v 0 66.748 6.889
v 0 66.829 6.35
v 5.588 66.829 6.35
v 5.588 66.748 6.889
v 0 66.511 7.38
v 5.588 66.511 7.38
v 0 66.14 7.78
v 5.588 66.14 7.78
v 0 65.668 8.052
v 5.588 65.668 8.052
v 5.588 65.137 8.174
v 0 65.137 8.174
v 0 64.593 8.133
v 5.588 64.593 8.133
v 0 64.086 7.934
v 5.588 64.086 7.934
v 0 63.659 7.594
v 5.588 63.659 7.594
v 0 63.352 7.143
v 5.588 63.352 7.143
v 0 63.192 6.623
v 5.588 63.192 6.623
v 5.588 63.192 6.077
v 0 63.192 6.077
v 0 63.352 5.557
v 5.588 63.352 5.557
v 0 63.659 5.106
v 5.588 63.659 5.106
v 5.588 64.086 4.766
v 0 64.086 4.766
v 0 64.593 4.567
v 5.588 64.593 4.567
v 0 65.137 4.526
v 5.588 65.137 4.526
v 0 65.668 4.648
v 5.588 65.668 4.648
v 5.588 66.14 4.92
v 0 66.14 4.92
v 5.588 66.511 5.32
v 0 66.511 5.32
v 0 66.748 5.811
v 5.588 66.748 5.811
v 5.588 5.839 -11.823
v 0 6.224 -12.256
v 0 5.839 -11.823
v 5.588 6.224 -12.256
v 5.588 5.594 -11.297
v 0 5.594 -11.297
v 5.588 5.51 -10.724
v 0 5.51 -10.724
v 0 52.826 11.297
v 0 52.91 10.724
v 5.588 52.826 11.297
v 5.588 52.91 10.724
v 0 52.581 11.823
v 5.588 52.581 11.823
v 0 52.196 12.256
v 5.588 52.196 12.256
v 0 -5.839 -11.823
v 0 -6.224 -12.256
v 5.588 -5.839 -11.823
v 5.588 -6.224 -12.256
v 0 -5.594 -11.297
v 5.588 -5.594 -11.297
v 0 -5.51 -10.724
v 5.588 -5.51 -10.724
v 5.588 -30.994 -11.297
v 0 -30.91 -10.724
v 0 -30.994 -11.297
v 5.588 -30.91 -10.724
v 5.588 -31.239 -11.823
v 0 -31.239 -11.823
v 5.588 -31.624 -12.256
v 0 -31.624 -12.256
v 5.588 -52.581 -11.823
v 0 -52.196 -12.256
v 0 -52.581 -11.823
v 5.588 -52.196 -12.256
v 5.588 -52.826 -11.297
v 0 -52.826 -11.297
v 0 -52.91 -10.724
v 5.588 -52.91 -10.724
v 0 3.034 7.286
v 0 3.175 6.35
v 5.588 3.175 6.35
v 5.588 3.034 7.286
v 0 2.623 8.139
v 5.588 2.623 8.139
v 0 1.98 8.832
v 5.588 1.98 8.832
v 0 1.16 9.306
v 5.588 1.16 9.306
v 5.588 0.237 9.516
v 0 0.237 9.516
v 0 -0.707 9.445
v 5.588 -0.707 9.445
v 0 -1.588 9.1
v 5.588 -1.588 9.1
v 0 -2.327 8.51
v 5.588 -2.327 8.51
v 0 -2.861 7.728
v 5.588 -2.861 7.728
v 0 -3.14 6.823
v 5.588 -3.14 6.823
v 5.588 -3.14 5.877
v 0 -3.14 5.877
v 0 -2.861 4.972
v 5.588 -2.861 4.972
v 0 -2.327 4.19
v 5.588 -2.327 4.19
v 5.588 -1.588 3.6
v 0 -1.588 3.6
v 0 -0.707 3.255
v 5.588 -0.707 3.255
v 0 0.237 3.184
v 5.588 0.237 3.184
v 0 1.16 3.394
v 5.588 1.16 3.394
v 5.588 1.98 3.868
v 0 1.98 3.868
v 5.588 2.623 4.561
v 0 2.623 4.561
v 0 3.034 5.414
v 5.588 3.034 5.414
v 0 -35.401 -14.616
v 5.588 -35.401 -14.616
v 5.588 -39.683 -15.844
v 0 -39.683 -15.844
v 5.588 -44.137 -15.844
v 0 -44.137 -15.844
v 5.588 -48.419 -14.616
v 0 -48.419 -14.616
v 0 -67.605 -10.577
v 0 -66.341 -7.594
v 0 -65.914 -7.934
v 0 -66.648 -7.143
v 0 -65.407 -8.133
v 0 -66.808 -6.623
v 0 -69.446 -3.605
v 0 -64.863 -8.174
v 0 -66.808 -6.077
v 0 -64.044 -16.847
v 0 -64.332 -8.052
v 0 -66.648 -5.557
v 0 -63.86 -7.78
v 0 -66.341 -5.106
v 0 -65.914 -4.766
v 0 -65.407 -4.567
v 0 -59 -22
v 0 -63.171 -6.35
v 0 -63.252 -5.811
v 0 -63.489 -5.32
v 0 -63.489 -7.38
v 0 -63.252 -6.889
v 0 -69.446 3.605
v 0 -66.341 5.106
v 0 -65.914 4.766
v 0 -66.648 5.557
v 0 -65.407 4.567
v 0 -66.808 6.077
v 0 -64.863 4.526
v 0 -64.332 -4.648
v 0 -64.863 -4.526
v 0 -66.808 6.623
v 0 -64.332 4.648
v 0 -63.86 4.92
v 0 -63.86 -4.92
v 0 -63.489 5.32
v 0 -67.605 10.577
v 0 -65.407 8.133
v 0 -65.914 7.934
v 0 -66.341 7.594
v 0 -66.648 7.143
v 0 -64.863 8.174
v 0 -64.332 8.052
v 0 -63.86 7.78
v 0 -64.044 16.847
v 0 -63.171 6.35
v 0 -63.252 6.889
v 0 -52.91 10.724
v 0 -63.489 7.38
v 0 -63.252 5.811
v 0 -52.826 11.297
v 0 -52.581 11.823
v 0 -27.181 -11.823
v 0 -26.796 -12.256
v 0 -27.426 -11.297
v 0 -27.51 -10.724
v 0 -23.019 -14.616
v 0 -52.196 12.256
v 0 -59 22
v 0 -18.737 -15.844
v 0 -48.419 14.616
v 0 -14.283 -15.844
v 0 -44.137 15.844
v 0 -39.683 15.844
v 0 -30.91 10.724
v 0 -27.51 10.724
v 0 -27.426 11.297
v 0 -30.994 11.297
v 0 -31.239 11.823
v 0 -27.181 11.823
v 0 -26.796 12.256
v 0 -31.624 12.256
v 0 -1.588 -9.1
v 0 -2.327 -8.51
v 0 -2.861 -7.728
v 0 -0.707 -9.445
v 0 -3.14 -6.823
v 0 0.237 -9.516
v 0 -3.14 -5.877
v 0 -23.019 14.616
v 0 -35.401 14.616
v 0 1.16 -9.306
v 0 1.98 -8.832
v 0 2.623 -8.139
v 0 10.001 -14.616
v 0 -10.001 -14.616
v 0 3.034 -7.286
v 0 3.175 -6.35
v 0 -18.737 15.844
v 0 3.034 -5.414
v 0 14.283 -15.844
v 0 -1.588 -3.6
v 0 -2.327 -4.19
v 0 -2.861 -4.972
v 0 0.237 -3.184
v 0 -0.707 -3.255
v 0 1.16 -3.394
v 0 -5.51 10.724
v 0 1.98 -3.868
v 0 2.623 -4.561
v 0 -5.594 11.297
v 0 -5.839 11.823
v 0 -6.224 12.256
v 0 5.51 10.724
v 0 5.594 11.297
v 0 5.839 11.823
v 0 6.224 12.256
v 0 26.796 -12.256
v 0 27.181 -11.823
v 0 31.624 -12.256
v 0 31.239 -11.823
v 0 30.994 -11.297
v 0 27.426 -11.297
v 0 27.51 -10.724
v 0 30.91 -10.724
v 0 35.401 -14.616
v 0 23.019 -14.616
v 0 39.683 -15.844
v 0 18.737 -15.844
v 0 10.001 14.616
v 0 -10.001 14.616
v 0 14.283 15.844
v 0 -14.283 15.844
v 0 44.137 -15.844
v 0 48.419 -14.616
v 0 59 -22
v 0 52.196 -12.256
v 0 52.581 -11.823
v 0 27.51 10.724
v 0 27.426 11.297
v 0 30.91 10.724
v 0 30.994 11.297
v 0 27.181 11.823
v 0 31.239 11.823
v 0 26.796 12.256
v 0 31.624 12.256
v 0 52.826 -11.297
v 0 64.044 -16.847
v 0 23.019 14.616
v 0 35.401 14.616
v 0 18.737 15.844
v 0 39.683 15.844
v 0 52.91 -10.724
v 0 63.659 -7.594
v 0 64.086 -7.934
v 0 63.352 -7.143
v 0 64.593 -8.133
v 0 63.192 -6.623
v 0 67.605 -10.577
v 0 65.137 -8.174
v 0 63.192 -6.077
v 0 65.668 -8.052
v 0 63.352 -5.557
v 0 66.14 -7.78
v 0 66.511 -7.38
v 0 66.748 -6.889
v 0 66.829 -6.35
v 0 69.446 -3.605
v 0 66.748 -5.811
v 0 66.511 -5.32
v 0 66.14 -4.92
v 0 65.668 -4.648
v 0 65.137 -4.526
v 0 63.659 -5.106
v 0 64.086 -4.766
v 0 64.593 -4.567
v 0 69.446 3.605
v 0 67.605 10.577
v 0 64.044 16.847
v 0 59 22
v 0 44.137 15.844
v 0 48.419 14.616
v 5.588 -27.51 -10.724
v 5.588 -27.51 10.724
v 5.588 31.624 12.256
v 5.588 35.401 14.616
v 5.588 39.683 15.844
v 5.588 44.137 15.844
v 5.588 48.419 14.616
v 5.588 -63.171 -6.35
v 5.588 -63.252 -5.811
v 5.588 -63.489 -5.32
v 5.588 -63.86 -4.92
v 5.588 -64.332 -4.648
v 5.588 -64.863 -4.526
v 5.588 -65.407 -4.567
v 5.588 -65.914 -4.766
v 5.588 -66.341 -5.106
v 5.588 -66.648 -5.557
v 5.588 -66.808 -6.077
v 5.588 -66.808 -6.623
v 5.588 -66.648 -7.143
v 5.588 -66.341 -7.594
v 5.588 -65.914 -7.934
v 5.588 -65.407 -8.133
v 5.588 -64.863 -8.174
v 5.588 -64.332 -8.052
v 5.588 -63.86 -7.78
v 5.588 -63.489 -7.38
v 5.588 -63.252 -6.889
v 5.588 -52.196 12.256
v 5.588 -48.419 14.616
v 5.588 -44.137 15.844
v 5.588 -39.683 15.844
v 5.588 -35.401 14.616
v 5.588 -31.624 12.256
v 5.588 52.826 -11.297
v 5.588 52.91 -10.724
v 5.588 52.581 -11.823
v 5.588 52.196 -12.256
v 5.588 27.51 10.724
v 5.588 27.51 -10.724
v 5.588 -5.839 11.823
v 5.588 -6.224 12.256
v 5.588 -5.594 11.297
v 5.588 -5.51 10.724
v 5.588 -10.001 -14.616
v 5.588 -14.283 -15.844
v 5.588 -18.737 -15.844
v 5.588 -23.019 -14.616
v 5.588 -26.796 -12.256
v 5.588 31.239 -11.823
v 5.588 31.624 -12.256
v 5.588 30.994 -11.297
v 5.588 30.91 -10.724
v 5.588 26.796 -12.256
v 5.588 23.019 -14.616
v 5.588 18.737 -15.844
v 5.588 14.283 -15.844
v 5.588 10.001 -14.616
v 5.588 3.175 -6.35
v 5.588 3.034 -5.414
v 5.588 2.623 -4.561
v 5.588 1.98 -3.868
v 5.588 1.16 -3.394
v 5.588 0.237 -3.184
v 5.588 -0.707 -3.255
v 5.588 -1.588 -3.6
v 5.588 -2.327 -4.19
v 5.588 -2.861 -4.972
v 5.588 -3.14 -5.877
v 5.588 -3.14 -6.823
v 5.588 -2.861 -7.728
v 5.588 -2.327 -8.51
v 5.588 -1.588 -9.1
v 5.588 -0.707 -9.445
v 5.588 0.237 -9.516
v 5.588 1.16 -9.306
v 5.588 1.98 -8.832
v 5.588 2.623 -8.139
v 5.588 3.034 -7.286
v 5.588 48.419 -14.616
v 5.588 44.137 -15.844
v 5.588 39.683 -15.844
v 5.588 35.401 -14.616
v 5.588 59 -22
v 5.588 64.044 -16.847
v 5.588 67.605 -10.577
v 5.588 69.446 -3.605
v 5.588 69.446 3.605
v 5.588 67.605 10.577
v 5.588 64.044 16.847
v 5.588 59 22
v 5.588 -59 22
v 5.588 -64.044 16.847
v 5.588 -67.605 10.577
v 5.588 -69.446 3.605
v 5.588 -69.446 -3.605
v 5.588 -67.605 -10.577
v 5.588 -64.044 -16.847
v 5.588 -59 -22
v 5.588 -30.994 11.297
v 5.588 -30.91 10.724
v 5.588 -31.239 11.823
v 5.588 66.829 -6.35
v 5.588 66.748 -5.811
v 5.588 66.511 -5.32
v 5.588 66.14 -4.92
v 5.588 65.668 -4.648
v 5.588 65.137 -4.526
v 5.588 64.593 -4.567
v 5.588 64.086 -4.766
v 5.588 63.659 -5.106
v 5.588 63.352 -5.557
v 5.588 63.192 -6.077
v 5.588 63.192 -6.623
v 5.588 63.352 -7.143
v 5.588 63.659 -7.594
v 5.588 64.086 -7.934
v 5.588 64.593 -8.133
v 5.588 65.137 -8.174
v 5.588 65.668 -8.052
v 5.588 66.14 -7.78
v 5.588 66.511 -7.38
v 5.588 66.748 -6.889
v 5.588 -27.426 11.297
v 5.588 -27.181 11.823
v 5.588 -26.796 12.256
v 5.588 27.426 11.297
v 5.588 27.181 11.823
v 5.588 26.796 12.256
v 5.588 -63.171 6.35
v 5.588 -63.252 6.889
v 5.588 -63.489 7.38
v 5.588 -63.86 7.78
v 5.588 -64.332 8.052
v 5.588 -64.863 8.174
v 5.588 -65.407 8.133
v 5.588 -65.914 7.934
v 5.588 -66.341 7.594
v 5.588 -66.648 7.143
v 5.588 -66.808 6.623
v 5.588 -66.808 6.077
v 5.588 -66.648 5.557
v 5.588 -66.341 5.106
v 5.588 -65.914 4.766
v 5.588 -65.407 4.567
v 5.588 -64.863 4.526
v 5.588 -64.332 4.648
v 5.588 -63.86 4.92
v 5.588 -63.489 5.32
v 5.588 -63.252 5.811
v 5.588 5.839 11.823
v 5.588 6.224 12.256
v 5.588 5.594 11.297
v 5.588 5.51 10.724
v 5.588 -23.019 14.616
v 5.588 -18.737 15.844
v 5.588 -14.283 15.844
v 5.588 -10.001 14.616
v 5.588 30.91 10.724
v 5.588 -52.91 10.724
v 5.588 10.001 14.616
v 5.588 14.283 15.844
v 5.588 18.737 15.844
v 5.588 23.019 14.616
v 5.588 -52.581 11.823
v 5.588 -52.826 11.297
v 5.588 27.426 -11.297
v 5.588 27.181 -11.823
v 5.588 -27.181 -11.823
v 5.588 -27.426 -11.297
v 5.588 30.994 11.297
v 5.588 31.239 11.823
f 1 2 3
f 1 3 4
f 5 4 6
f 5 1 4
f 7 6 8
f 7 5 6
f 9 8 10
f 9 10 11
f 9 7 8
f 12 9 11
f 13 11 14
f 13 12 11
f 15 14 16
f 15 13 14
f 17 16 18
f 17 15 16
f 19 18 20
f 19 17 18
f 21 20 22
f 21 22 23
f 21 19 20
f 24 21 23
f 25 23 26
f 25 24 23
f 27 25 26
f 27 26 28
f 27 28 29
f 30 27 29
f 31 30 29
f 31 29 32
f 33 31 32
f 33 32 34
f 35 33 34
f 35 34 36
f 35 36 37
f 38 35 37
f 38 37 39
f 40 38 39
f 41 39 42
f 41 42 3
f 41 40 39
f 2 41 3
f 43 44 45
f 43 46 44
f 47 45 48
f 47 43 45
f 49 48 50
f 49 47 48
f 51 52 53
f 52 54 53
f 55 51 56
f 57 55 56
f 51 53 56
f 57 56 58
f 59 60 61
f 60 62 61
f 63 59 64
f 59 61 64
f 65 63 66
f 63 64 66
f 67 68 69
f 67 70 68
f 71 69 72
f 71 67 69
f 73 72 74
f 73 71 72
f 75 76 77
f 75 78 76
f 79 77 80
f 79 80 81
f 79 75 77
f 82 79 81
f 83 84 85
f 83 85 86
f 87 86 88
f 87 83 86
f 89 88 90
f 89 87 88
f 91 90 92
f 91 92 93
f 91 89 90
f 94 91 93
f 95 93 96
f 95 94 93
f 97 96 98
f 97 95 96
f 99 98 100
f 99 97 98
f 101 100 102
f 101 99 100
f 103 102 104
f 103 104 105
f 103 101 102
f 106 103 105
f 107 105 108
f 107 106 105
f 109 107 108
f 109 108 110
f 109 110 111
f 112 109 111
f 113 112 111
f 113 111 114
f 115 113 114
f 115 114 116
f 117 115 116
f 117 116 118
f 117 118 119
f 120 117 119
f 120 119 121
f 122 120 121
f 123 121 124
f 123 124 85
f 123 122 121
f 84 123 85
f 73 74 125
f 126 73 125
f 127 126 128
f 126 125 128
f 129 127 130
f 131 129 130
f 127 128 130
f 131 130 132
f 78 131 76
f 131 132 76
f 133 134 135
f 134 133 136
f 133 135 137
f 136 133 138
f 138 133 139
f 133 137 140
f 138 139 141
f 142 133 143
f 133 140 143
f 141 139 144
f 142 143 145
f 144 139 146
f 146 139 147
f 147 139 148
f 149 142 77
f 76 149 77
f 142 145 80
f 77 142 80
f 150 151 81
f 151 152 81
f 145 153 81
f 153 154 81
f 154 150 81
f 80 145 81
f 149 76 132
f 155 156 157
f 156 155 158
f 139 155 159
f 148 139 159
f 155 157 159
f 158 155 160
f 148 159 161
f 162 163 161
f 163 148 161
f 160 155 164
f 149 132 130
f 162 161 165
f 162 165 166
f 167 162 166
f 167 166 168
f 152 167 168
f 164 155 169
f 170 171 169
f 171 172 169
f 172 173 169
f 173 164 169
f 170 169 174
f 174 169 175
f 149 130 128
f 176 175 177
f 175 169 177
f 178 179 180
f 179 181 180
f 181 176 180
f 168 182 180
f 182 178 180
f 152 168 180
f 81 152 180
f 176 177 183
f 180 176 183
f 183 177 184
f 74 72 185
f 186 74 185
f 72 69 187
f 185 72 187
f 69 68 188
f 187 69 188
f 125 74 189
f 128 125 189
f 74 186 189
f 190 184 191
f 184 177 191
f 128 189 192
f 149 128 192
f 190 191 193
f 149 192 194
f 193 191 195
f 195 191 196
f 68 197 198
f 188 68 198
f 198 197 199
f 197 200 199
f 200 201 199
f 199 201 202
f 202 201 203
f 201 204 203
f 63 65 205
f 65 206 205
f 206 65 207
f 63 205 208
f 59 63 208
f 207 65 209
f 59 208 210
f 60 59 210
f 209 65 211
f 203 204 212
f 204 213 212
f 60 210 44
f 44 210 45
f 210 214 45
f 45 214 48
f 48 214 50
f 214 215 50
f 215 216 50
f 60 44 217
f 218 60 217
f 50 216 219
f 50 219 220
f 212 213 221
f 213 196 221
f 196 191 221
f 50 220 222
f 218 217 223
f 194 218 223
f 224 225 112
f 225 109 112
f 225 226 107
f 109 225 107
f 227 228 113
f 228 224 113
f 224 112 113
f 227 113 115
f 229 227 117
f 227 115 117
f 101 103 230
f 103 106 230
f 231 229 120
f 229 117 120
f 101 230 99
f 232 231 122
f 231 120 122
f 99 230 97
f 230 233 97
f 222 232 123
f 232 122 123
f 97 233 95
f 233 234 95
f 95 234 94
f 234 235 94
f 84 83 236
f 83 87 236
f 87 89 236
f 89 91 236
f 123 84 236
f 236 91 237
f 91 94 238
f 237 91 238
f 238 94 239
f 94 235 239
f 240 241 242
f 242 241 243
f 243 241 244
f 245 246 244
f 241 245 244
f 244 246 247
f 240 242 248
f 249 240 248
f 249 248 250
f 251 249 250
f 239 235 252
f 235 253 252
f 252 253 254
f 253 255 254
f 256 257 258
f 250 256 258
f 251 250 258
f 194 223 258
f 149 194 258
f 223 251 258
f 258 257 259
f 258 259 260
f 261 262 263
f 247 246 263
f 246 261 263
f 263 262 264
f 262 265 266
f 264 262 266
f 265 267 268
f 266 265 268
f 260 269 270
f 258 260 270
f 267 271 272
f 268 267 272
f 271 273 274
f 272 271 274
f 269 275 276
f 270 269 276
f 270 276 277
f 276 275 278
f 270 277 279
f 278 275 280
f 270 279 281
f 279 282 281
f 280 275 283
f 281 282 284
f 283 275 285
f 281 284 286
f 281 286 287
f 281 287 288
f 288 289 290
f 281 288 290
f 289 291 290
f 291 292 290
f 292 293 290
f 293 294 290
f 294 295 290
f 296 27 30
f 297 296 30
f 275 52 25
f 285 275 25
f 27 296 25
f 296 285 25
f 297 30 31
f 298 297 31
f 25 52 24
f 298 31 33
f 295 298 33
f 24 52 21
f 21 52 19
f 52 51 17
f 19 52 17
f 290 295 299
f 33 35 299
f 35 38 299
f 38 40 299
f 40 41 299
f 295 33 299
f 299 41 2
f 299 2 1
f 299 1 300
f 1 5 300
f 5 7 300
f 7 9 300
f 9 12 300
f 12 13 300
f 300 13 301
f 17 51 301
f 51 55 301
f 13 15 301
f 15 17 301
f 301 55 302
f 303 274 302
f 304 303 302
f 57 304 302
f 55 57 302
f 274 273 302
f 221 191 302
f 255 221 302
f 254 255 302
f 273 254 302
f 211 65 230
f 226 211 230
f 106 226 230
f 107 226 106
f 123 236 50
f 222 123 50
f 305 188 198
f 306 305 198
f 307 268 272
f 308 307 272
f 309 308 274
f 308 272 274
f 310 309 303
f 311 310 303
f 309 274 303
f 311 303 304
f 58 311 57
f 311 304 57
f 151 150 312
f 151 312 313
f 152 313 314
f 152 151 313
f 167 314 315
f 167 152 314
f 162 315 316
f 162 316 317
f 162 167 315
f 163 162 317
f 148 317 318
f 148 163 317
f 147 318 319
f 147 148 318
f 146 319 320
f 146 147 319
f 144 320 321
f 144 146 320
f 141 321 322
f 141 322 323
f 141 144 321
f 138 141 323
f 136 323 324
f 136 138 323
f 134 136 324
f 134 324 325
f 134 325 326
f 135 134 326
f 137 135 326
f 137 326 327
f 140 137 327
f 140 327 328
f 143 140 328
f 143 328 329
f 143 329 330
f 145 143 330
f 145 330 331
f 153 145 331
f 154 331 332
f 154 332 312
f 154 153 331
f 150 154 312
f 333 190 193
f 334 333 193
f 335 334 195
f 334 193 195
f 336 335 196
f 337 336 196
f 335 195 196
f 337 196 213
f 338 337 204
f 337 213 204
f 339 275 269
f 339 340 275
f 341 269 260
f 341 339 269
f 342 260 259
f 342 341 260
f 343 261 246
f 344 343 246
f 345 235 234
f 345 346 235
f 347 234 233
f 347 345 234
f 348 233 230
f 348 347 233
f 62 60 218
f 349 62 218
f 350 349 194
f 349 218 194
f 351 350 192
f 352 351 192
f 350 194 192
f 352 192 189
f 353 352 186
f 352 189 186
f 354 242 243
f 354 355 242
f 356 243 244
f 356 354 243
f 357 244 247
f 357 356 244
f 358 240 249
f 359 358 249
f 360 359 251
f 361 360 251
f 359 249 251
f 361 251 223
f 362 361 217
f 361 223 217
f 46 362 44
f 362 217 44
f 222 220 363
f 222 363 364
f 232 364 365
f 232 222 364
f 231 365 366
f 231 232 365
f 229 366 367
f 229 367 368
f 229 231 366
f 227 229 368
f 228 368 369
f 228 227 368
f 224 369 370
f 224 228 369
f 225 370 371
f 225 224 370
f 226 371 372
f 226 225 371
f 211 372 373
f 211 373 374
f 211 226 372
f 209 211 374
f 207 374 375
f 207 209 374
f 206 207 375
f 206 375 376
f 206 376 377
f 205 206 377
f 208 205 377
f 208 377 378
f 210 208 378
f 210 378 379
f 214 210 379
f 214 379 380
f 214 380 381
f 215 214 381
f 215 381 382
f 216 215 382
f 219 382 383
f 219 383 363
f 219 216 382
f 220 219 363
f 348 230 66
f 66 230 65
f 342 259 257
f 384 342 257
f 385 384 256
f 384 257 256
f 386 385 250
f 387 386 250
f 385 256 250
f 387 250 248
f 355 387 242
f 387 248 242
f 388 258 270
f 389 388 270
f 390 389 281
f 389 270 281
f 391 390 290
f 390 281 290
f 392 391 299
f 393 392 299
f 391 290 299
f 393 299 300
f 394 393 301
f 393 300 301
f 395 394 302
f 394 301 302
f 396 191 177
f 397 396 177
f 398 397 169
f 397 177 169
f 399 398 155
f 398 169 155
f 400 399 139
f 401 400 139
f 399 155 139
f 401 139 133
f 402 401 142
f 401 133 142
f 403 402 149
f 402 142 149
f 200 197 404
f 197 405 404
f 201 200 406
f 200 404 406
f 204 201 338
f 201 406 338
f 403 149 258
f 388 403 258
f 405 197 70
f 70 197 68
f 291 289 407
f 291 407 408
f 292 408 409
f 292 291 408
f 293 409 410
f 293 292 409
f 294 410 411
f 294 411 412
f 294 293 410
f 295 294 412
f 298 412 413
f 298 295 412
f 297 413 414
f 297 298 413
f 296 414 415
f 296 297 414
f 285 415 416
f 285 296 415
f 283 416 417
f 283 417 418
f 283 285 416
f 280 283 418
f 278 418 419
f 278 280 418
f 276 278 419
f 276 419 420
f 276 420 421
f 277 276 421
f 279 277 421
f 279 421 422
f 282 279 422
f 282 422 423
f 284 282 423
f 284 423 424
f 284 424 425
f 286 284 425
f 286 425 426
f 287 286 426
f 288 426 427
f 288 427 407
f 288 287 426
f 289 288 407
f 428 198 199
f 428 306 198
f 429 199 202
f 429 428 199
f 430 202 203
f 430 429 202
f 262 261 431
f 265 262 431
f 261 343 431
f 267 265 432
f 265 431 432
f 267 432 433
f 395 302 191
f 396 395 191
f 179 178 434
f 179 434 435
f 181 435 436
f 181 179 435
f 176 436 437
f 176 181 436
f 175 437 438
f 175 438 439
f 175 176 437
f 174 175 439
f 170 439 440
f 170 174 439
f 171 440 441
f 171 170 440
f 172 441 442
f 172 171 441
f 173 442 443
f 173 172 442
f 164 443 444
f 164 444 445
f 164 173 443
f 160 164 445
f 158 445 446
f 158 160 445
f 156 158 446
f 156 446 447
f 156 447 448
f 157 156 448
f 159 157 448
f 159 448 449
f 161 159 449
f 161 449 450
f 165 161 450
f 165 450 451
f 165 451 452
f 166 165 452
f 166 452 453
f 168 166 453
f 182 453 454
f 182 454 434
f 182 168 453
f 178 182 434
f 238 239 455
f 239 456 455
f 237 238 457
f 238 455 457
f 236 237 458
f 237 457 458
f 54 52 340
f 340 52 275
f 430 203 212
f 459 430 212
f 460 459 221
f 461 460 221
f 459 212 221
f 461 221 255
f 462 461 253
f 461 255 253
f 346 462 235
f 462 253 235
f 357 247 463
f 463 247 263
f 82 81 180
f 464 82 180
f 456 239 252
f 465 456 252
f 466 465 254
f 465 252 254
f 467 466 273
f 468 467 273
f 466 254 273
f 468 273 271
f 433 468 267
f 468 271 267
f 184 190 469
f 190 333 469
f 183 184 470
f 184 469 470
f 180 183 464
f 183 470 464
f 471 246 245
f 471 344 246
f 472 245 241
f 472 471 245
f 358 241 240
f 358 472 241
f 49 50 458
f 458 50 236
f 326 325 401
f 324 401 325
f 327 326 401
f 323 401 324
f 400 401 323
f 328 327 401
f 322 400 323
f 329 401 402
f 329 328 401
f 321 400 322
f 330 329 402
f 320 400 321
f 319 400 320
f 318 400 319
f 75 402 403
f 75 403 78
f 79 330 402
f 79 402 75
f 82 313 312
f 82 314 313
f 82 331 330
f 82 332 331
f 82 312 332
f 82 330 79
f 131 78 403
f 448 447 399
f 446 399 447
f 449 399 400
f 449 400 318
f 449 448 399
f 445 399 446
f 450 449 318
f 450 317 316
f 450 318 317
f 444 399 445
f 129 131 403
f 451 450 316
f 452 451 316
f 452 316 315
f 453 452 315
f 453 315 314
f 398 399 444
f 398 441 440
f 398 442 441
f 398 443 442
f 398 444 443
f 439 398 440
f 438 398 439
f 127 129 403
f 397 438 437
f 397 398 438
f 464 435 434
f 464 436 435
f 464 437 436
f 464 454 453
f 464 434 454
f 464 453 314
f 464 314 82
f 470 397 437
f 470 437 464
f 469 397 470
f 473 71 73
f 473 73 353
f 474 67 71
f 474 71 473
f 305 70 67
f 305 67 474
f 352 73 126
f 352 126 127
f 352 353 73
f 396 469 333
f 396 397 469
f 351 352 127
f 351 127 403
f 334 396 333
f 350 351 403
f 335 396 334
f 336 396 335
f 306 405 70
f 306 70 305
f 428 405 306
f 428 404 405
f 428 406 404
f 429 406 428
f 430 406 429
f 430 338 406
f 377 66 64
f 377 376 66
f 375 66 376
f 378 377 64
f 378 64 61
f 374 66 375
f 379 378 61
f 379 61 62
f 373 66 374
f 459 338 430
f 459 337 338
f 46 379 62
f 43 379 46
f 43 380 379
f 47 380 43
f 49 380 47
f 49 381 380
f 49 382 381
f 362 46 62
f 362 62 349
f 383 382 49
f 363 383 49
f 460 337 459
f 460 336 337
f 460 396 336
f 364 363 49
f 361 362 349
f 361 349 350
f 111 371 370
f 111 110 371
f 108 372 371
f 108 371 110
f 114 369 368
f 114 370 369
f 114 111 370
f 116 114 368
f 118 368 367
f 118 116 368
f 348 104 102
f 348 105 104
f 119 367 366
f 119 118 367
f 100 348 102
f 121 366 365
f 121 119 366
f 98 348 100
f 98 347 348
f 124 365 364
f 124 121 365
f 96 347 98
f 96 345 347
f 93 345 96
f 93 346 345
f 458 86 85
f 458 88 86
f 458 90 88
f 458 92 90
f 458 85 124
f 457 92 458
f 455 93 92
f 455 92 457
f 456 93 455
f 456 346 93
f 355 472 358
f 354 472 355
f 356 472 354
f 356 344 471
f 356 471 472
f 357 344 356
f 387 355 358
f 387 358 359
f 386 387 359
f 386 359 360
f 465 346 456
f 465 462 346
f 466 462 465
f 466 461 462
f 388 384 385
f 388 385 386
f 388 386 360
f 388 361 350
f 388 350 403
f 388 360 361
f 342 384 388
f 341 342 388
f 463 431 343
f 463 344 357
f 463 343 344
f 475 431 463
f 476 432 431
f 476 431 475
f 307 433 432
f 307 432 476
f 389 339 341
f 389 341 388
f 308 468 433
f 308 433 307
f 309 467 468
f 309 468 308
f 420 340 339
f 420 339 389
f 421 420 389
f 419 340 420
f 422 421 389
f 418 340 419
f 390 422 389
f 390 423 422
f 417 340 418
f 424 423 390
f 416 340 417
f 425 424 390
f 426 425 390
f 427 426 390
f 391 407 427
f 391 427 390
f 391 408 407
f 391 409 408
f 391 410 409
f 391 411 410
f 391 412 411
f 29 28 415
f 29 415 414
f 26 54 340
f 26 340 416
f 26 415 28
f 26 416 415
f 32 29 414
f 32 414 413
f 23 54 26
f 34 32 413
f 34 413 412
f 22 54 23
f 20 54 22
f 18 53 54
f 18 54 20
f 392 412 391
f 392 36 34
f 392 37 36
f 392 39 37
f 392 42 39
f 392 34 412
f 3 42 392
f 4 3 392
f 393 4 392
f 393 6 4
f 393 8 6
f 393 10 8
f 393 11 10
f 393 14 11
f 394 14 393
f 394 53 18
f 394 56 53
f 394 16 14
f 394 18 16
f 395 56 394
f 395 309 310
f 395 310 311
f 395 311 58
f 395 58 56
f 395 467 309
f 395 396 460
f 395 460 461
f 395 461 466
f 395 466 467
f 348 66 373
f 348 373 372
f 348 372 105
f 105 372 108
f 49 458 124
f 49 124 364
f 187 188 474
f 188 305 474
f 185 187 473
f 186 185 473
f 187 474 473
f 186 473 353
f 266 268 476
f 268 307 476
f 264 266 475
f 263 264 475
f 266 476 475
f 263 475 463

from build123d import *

# Parameters (mm, degrees)
F0_R     = 1.8288
F0_R_2   = 3.175
F1_DEPTH = 5.588
F2_R     = 2


# Not quite as in the source:
# - a feature names something its author has since deleted; it is built from what else it names


with BuildPart() as f1:
    # F0 (on Right) → F1 (new body)
    with BuildSketch(Plane.YZ):
        with BuildLine():
            ThreePointArc((59, -22), (69.6794919243, 0), (59, 22))
            Line((59, 22), (-59, 22))
            ThreePointArc((-59, 22), (-69.6794919243, 0), (-59, -22))
            Line((-59, -22), (59, -22))
        make_face()
        with Locations((-65, -6.35)):
            Circle(F0_R, mode=Mode.SUBTRACT)
        with Locations((0, -6.35)):
            Circle(F0_R_2, mode=Mode.SUBTRACT)
        with Locations((65, -6.35)):
            Circle(F0_R, mode=Mode.SUBTRACT)
        with BuildLine():
            ThreePointArc((-30.91, -11.6189500386), (-41.91, -16), (-52.91, -11.6189500386))
            Line((-52.91, -11.6189500386), (-52.91, 11.6189500386))
            ThreePointArc((-52.91, 11.6189500386), (-41.91, 16), (-30.91, 11.6189500386))
            Line((-30.91, 11.6189500386), (-30.91, -11.6189500386))
        make_face(mode=Mode.SUBTRACT)
        with Locations((-65, 6.35)):
            Circle(F0_R, mode=Mode.SUBTRACT)
        with BuildLine():
            ThreePointArc((-27.51, 11.6189500386), (-16.51, 16), (-5.51, 11.6189500386))
            Line((-5.51, 11.6189500386), (-5.51, -11.6189500386))
            ThreePointArc((-5.51, -11.6189500386), (-16.51, -16), (-27.51, -11.6189500386))
            Line((-27.51, -11.6189500386), (-27.51, 11.6189500386))
        make_face(mode=Mode.SUBTRACT)
        with BuildLine():
            ThreePointArc((27.51, -11.6189500386), (16.51, -16), (5.51, -11.6189500386))
            Line((5.51, -11.6189500386), (5.51, 11.6189500386))
            ThreePointArc((5.51, 11.6189500386), (16.51, 16), (27.51, 11.6189500386))
            Line((27.51, 11.6189500386), (27.51, -11.6189500386))
        make_face(mode=Mode.SUBTRACT)
        with Locations((0, 6.35)):
            Circle(F0_R_2, mode=Mode.SUBTRACT)
        with BuildLine():
            ThreePointArc((52.91, -11.6189500386), (41.91, -16), (30.91, -11.6189500386))
            Line((30.91, -11.6189500386), (30.91, 11.6189500386))
            ThreePointArc((30.91, 11.6189500386), (41.91, 16), (52.91, 11.6189500386))
            Line((52.91, 11.6189500386), (52.91, -11.6189500386))
        make_face(mode=Mode.SUBTRACT)
        with Locations((65, 6.35)):
            Circle(F0_R, mode=Mode.SUBTRACT)
    extrude(amount=F1_DEPTH)

    # F2
    f2_edges = [f1.edges().sort_by_distance(p)[0] for p in [
        (2.794, -5.51, 11.61895),
        (2.794, 52.91, 11.61895),
        (2.794, 5.51, -11.61895),
        (2.794, 5.51, 11.61895),
        (2.794, -52.91, -11.61895),
        (2.794, -52.91, 11.61895),
        (2.794, -5.51, -11.61895),
        (2.794, 52.91, -11.61895),
        (2.794, -30.91, -11.61895),
        (2.794, -30.91, 11.61895),
        (2.794, -27.51, -11.61895),
        (2.794, -27.51, 11.61895),
        (2.794, 27.51, 11.61895),
        (2.794, 27.51, -11.61895),
        (2.794, 30.91, 11.61895),
        (2.794, 30.91, -11.61895),
    ]]
    fillet(f2_edges, radius=F2_R)


solid = f1.part
